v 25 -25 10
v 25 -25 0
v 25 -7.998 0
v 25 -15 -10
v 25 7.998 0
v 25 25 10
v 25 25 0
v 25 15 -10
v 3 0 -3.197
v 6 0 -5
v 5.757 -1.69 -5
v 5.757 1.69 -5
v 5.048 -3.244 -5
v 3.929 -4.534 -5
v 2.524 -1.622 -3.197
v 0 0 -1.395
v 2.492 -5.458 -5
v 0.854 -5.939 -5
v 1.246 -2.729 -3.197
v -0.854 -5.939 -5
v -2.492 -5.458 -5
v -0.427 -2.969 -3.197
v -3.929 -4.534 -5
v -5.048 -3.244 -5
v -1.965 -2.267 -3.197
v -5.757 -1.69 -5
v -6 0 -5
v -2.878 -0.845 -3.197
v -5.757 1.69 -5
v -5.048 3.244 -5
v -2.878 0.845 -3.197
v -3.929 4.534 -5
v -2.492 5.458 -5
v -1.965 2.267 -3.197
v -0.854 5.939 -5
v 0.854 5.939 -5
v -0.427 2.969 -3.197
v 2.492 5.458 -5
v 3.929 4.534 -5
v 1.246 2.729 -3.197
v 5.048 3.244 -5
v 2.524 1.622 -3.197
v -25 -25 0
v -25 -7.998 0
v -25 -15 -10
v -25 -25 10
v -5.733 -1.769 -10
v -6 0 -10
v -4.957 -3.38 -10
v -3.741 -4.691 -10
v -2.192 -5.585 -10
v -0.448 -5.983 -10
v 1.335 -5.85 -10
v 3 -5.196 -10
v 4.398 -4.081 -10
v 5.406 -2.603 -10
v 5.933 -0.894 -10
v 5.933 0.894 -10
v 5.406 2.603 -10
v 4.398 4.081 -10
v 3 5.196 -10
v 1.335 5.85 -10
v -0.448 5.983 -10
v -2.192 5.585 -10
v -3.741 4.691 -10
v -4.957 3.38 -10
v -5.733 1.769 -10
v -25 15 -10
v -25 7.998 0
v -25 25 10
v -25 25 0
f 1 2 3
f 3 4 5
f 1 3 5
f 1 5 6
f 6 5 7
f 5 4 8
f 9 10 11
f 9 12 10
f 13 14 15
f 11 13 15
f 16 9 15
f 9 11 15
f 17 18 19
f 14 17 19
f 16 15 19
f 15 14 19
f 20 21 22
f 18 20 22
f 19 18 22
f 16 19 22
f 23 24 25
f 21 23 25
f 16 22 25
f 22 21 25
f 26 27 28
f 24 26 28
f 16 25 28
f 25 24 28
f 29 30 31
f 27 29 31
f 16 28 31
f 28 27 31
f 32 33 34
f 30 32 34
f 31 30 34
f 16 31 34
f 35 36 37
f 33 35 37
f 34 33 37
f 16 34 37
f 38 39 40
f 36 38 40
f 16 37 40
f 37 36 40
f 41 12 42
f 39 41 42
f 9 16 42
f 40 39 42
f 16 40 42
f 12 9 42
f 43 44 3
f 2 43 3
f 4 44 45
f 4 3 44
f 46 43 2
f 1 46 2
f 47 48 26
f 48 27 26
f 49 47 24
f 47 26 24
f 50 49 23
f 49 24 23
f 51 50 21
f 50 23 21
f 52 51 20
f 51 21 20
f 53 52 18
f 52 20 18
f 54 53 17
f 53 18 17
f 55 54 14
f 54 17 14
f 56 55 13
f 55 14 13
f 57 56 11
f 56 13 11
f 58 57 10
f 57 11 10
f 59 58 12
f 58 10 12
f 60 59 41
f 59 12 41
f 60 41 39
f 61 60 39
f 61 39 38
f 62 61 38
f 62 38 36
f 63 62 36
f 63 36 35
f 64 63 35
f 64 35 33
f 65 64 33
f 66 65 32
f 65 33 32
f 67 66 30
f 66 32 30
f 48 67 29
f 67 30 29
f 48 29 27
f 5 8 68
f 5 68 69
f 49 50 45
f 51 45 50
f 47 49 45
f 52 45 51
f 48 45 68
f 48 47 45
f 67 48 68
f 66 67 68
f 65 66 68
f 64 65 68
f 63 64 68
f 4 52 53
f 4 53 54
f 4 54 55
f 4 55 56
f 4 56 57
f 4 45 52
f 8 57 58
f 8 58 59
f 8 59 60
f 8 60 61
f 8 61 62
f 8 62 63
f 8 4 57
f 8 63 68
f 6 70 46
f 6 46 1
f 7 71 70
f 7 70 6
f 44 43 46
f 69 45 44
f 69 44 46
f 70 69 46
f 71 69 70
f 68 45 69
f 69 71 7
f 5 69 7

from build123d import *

# Parameters (mm, degrees)
F0_W     = 50
F0_H     = 50
F1_DEPTH = 10
F3_DEPTH = 25
F5_D     = 12
F5_DEPTH = 5
F5_TIP   = 3.6051637142


with BuildPart() as f1:
    # F0 (on Top) → F1 (new body)
    with BuildSketch(Plane.XY):
        Rectangle(F0_W, F0_H)
    extrude(amount=F1_DEPTH)

    # F2 (on Right) → F3 (join, symmetric)
    with BuildSketch(Plane.YZ):
        Polygon((0, -10), (0, 0), (-7.9979246179, 0), (-15, -10), align=None)
        Polygon((7.9979246179, 0), (0, 0), (0, -10), (15, -10), align=None)
    extrude(amount=F3_DEPTH, both=True)

    # F5
    with Locations(Plane(origin=(0, 0, -10), x_dir=(1, 0, 0), z_dir=(0, 0, -1))):
        with Locations((0, 0)):
            Hole(F5_D / 2, depth=F5_DEPTH)
            with Locations((0, 0, -(F5_DEPTH + F5_TIP / 2))):  # 118° drill point
                Cone(0, F5_D / 2, F5_TIP, mode=Mode.SUBTRACT)


solid = f1.part
